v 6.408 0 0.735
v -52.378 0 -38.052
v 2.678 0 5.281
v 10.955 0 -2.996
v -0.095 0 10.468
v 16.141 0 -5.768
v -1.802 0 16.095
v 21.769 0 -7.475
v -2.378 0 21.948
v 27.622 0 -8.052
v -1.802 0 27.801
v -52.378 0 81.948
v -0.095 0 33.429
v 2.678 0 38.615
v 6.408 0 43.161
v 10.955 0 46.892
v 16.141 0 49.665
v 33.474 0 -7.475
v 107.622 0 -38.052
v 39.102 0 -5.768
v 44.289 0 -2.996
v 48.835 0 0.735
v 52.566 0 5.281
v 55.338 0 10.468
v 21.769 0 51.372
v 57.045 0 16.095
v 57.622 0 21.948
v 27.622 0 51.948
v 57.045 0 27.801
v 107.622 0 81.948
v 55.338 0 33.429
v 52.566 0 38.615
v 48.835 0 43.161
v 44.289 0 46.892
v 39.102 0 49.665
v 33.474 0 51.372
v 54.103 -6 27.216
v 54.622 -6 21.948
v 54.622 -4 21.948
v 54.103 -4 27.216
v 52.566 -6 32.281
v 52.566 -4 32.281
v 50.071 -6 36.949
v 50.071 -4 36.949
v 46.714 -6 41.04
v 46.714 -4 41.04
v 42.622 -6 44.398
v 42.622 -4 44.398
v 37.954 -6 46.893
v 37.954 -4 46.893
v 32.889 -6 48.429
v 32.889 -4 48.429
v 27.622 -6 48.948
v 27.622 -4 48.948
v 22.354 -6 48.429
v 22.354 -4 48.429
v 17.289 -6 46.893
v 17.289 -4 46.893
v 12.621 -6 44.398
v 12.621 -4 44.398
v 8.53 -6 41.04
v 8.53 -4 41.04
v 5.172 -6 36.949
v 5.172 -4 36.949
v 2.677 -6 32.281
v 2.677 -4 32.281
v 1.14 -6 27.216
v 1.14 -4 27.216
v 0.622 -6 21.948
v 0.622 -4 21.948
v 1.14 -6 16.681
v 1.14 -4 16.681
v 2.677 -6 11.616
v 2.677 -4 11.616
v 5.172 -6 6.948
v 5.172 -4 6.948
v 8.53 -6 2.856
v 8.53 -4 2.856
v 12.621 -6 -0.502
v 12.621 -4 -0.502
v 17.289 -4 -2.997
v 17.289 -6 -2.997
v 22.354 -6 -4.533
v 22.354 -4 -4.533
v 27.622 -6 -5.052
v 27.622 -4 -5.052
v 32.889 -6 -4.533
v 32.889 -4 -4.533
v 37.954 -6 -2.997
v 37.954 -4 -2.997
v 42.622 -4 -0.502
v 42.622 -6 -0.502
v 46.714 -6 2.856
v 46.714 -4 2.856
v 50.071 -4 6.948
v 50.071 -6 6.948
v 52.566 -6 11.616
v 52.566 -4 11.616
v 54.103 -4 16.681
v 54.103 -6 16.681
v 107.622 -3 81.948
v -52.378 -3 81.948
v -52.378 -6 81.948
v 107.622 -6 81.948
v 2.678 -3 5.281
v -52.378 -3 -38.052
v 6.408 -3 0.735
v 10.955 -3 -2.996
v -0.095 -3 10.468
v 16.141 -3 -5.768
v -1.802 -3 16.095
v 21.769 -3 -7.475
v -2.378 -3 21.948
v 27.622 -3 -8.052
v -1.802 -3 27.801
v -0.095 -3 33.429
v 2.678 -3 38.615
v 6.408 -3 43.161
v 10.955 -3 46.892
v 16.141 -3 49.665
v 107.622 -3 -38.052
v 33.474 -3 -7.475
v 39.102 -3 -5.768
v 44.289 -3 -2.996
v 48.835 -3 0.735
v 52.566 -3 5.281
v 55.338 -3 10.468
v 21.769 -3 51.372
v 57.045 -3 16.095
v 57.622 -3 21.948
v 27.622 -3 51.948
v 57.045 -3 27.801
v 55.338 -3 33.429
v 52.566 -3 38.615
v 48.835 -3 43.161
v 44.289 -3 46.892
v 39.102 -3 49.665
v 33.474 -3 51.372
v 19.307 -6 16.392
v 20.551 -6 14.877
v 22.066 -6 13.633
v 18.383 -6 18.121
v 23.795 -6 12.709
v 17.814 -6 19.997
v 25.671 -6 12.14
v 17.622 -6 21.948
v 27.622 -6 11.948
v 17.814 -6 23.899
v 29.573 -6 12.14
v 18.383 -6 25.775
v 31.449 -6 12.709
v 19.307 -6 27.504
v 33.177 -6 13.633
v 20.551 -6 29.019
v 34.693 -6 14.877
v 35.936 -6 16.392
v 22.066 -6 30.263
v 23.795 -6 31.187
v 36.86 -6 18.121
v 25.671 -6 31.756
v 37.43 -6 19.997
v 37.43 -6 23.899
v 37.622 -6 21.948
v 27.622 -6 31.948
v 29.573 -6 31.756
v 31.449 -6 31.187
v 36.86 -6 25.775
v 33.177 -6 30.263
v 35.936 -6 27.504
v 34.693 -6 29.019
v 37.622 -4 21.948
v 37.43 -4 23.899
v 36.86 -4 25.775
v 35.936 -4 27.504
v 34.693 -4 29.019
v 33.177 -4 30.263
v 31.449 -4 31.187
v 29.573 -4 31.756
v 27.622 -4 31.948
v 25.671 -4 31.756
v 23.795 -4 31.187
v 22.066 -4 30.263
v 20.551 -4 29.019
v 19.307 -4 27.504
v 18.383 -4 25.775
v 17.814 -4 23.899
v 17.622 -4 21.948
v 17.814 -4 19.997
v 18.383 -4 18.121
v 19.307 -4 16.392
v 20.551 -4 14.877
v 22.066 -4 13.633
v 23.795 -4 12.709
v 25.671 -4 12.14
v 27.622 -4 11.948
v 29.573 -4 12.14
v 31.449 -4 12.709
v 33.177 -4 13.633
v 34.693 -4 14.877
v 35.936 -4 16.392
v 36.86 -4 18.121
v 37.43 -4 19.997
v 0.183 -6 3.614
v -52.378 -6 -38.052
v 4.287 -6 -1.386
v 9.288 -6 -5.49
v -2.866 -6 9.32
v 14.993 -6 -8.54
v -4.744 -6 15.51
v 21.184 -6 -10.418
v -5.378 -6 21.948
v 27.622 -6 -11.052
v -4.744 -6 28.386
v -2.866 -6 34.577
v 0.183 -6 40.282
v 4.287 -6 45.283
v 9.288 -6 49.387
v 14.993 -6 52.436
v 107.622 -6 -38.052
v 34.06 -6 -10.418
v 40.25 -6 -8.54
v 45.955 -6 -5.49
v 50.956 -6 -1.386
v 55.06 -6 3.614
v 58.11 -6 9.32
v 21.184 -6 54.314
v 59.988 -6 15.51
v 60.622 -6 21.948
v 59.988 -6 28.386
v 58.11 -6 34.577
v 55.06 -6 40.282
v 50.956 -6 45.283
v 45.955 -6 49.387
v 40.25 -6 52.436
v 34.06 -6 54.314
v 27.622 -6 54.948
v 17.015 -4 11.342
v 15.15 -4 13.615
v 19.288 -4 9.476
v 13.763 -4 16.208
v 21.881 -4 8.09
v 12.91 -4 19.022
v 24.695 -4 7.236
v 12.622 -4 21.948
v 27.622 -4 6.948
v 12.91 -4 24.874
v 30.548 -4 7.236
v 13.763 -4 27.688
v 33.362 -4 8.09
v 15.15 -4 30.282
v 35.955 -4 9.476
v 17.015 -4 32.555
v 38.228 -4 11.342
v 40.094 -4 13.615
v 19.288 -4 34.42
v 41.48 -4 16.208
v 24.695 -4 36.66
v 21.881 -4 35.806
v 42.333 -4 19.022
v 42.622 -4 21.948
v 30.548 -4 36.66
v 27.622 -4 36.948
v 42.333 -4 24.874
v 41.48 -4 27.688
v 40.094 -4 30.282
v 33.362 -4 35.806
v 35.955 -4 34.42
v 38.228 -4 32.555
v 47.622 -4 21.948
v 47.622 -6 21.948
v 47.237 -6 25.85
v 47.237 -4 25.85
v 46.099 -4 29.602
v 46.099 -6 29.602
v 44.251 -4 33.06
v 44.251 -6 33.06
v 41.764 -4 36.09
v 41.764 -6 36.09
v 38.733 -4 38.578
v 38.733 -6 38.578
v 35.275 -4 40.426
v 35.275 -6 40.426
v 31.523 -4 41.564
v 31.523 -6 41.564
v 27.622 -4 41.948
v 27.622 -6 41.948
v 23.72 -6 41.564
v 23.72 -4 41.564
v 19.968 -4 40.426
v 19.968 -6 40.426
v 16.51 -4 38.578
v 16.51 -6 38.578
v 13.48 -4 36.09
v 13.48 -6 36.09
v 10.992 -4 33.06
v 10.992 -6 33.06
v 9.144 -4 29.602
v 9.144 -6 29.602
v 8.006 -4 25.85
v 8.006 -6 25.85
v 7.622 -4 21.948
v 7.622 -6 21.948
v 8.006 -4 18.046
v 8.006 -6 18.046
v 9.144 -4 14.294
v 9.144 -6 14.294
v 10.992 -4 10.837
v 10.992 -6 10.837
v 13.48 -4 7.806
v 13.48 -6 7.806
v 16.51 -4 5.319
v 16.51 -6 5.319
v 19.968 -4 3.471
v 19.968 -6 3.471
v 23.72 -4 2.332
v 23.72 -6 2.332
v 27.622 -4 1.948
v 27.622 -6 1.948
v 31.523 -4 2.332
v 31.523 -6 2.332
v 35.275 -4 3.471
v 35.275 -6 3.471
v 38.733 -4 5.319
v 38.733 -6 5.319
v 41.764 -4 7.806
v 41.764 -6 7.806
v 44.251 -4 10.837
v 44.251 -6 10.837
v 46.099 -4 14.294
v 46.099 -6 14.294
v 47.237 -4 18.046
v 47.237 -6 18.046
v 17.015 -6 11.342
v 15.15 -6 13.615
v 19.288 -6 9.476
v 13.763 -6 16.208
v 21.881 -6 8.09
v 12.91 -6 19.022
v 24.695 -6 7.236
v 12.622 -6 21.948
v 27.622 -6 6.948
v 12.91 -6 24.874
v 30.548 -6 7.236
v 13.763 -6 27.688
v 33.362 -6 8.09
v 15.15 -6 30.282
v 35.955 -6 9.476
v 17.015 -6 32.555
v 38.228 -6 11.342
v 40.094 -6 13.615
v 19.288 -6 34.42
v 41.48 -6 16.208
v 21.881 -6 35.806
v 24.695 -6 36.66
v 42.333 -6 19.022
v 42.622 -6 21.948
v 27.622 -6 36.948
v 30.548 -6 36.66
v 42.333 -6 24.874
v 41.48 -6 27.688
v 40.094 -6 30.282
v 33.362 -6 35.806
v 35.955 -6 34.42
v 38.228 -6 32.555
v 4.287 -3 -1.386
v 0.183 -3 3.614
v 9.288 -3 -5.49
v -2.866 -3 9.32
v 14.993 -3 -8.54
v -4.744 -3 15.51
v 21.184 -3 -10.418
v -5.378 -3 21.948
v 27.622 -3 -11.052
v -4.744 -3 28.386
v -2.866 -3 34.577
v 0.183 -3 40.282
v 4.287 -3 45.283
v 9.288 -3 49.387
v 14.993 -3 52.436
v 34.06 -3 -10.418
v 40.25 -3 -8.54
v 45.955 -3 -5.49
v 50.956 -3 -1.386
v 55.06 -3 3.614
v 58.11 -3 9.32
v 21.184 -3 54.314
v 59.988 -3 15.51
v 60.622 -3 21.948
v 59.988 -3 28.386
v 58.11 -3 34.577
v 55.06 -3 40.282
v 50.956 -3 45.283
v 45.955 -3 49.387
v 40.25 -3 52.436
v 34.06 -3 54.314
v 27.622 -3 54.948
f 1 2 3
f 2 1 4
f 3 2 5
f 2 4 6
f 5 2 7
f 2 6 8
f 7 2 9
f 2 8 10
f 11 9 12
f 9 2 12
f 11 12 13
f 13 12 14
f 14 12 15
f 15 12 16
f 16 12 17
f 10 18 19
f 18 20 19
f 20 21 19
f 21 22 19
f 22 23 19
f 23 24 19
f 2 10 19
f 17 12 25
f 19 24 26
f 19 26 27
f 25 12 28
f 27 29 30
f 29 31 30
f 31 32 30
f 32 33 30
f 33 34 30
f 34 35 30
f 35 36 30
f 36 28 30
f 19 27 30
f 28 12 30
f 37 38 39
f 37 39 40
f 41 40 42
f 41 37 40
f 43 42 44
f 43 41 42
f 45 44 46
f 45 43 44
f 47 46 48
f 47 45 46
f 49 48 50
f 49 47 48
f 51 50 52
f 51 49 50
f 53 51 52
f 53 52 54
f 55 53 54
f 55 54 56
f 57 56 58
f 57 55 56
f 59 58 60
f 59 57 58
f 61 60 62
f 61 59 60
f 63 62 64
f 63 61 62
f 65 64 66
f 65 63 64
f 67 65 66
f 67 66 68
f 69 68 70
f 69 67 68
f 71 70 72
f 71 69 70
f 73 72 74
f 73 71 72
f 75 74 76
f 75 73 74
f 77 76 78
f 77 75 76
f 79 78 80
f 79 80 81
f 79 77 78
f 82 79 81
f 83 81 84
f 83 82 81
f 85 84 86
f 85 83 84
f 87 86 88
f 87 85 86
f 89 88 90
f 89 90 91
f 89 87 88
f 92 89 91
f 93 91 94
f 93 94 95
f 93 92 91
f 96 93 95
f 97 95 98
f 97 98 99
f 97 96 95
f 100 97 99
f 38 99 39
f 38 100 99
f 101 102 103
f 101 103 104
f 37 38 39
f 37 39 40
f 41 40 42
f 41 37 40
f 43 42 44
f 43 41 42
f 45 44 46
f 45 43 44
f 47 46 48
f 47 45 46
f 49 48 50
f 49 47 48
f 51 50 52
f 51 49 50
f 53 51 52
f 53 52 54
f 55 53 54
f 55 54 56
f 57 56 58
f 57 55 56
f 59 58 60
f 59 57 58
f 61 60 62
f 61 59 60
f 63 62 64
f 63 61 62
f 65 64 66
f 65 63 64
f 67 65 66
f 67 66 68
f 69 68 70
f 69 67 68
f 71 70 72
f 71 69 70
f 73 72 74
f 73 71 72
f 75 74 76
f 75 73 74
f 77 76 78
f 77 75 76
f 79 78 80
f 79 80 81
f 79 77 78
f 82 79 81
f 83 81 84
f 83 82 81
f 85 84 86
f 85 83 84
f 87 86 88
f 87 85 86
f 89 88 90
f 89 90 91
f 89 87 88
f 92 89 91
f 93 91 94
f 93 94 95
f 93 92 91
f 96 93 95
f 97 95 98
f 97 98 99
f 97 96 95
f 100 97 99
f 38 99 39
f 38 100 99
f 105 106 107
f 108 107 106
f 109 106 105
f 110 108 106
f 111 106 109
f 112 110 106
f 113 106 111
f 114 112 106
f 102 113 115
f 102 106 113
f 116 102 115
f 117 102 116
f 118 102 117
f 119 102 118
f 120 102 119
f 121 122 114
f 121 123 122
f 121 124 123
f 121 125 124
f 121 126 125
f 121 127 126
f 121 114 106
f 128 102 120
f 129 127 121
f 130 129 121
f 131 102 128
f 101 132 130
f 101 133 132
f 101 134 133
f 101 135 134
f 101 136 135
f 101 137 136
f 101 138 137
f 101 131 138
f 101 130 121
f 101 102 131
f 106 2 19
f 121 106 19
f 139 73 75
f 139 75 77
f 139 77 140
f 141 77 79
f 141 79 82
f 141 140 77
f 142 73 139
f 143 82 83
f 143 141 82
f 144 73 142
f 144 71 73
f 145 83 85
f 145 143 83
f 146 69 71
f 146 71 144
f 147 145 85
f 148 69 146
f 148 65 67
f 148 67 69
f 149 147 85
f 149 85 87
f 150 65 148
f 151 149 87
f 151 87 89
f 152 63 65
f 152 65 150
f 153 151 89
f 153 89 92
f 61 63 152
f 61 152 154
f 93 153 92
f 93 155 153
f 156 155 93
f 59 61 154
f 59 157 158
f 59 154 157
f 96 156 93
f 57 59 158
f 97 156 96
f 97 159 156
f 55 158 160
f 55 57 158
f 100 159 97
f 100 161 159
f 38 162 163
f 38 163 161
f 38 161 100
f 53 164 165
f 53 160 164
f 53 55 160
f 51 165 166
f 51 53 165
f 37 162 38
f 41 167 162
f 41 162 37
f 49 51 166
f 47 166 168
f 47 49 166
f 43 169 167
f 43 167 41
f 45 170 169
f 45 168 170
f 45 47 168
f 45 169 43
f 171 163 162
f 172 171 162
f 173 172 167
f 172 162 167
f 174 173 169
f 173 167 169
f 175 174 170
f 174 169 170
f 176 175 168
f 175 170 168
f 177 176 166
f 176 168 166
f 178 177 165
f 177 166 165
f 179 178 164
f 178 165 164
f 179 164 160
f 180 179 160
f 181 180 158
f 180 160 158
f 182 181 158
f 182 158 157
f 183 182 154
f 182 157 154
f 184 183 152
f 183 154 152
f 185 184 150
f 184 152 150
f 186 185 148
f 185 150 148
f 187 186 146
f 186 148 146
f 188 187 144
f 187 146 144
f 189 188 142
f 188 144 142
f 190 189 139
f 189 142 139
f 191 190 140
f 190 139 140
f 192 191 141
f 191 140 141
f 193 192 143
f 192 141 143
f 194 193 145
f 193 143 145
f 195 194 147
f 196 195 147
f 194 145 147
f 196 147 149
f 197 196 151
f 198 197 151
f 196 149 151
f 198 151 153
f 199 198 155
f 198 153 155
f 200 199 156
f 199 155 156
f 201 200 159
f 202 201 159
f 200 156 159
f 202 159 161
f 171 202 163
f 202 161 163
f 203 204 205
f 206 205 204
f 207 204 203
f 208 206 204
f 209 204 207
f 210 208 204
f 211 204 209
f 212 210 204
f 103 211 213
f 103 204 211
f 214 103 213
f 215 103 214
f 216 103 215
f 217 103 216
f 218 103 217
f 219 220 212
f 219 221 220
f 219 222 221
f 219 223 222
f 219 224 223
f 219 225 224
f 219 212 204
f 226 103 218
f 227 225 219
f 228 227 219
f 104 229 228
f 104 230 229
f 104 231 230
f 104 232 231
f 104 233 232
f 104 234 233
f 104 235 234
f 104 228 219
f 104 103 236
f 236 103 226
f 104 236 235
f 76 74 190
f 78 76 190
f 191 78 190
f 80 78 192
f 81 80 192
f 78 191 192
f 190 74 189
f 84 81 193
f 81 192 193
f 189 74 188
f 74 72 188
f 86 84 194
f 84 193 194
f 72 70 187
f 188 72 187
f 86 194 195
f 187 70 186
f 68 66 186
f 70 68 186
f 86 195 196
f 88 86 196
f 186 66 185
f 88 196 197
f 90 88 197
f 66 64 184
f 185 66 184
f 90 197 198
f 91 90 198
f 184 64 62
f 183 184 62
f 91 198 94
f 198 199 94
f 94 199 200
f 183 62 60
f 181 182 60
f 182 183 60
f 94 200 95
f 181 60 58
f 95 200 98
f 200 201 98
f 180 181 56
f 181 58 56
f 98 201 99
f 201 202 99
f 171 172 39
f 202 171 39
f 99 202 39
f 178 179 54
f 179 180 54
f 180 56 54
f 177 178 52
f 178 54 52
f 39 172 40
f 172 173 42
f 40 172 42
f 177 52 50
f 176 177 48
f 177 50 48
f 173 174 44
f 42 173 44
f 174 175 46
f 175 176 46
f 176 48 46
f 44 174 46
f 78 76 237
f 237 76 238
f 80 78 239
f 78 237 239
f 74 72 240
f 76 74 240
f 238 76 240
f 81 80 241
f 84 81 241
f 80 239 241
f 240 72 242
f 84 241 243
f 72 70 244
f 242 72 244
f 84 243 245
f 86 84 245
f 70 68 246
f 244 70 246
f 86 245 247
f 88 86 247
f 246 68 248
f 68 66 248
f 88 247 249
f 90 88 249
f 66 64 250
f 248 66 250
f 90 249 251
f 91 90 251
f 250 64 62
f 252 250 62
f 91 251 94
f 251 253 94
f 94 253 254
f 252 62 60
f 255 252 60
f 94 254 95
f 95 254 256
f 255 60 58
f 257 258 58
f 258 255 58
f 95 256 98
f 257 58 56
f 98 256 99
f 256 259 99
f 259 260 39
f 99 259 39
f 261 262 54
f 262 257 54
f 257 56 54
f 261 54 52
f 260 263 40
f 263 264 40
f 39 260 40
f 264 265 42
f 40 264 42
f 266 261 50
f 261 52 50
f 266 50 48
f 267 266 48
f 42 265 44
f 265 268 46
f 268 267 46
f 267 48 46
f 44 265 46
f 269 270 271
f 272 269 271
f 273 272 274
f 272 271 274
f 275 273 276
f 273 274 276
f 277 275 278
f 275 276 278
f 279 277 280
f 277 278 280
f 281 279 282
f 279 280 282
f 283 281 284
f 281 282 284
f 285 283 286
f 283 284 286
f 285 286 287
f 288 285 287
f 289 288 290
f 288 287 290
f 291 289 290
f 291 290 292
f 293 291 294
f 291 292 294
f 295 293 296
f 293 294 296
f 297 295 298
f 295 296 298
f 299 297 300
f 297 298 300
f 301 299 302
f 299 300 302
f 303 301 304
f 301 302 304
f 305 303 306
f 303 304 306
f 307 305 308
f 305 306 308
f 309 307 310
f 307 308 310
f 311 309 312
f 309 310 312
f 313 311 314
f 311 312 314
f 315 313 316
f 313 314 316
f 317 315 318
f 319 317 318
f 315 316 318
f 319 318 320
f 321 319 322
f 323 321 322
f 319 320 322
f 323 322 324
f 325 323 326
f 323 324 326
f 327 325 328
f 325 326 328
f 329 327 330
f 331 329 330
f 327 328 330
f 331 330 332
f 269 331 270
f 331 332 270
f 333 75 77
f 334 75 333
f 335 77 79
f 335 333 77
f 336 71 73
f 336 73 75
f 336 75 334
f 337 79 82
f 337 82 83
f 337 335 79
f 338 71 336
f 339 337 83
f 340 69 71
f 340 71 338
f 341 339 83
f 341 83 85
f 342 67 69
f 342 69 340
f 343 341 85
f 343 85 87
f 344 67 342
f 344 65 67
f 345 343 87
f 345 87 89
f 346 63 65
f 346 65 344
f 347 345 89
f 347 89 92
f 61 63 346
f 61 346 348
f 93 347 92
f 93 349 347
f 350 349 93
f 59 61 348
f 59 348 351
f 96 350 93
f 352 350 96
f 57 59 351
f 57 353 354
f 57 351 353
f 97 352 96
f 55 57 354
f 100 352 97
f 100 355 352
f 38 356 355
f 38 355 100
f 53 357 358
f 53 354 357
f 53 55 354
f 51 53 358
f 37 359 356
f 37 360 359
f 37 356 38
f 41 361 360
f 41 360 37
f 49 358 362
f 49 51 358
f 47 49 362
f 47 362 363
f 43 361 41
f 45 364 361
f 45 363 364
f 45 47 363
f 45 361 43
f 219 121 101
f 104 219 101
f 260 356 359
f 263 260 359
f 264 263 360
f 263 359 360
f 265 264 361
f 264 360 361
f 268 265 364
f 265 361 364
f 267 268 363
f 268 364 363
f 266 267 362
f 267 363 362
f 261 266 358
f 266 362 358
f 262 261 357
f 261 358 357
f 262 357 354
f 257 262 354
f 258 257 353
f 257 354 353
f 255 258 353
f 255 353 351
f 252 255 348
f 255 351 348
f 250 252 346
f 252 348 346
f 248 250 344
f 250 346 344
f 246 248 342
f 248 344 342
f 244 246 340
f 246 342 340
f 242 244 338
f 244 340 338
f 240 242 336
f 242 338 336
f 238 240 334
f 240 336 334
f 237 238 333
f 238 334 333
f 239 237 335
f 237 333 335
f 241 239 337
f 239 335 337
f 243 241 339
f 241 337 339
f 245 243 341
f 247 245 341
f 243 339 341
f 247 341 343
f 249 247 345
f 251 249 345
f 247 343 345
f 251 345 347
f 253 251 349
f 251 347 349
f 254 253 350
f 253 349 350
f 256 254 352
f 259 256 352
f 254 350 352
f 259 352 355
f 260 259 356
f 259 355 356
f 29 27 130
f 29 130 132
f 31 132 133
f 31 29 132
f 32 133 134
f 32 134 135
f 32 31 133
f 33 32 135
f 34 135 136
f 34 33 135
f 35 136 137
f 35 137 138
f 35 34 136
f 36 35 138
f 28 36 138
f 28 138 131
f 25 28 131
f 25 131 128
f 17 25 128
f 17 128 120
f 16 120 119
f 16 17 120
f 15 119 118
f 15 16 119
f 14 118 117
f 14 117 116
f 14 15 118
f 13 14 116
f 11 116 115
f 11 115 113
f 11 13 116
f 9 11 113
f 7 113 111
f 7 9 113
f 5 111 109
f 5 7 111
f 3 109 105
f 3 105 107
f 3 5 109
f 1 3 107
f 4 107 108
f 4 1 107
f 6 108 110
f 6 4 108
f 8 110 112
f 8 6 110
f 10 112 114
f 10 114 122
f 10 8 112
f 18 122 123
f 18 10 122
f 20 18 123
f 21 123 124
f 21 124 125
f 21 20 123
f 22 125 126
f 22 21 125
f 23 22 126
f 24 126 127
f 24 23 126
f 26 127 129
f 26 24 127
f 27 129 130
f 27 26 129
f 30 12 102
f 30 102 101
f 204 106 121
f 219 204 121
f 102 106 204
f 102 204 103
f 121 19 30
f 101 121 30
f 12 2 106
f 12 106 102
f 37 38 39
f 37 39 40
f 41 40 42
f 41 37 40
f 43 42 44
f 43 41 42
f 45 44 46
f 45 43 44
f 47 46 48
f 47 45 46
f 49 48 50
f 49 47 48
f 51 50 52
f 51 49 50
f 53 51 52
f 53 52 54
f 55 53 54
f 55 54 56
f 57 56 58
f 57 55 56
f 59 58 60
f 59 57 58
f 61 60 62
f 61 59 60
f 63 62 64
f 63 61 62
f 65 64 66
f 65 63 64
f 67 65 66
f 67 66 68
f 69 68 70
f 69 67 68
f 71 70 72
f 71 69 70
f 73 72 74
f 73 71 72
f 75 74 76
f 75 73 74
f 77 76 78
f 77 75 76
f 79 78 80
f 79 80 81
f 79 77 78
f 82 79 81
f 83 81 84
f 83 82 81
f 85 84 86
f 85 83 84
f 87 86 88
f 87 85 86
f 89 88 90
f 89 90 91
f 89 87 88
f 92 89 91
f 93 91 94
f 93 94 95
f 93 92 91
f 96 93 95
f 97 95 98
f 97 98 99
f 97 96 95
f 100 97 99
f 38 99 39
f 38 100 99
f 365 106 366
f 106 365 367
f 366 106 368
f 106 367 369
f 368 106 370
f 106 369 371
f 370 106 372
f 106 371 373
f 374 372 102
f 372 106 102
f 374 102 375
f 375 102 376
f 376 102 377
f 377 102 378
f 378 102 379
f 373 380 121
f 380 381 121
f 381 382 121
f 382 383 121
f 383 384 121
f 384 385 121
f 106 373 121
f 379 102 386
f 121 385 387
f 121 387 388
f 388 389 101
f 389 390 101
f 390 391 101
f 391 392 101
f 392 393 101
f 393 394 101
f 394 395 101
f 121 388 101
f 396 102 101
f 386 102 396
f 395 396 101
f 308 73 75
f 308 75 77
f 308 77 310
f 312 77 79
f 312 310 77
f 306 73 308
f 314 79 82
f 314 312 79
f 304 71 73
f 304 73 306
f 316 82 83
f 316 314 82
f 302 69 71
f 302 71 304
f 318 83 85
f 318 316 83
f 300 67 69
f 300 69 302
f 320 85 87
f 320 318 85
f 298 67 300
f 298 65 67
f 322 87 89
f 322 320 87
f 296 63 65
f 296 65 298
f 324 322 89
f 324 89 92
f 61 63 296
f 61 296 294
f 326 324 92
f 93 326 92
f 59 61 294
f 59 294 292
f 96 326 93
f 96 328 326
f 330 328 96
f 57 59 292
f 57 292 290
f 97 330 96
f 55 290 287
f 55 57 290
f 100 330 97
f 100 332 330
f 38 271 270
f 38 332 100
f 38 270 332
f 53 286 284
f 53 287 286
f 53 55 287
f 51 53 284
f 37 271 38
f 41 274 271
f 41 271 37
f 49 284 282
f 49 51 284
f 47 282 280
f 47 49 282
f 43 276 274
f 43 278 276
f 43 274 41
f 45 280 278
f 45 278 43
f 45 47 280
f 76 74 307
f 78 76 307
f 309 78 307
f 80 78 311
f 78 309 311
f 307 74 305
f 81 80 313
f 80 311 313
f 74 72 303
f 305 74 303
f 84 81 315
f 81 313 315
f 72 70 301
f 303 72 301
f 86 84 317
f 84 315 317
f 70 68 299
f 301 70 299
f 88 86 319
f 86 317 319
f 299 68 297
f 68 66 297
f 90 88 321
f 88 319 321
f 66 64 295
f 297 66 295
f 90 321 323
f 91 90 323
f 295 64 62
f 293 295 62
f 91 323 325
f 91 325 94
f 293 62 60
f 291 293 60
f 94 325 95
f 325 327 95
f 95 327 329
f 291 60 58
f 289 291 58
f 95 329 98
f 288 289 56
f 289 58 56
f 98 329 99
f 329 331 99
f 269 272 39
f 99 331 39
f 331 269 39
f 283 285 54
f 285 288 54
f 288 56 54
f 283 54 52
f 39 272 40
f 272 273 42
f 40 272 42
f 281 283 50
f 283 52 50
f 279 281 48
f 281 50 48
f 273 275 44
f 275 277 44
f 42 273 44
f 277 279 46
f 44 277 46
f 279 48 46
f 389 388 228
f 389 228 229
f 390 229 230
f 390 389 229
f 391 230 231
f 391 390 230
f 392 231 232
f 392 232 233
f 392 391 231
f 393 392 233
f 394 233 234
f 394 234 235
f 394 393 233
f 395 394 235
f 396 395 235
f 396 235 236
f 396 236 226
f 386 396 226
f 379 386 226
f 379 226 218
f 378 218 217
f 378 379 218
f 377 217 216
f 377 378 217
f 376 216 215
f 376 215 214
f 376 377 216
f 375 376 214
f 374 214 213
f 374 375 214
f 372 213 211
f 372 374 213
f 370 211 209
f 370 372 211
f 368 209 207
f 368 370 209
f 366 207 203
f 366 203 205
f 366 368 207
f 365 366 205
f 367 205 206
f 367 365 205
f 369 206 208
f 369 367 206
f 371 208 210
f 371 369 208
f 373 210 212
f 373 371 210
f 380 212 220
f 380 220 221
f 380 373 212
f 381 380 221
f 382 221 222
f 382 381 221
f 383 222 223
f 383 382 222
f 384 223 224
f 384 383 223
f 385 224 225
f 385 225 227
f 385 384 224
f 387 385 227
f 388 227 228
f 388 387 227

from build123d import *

# Parameters (mm, degrees)
F0_W     = 160
F0_H     = 120
F0_R     = 30
F1_DEPTH = 3
F2_W     = 160
F2_H     = 120
F2_R     = 33
F3_DEPTH = 3
F4_R     = 27
F4_R_2   = 20
F5_DEPTH = 2
F6_R     = 27
F6_R_2   = 15
F7_DEPTH = 2
F8_R     = 27
F8_R_2   = 10
F9_DEPTH = 2


with BuildPart() as f1:
    # F0 (on Front) → F1 (new body)
    with BuildSketch(Plane.XZ):
        with Locations((27.621666, 21.948145)):
            Rectangle(F0_W, F0_H)
        with Locations((27.621666, 21.948145)):
            Circle(F0_R, mode=Mode.SUBTRACT)
    extrude(amount=F1_DEPTH)


with BuildPart() as f3:
    # F2 (on face) → F3 (new body)
    with BuildSketch(Plane.XZ.offset(3)):
        with Locations((27.621666, 21.948145)):
            Rectangle(F2_W, F2_H)
        with Locations((27.621666, 21.948145)):
            Circle(F2_R, mode=Mode.SUBTRACT)
    extrude(amount=F3_DEPTH)


with BuildPart() as f5:
    # F4 (on face) → F5 (new body)
    with BuildSketch(Plane.XZ.offset(6)):
        with Locations((27.621666, 21.948145)):
            Circle(F4_R)
        with Locations((27.621666, 21.948145)):
            Circle(F4_R_2, mode=Mode.SUBTRACT)
    extrude(amount=-F5_DEPTH)


with BuildPart() as f7:
    # F6 (on face) → F7 (new body)
    with BuildSketch(Plane.XZ.offset(6)):
        with Locations((27.621666, 21.948145)):
            Circle(F6_R)
        with Locations((27.621666, 21.948145)):
            Circle(F6_R_2, mode=Mode.SUBTRACT)
    extrude(amount=-F7_DEPTH)


with BuildPart() as f9:
    # F8 (on face) → F9 (new body)
    with BuildSketch(Plane.XZ.offset(6)):
        with Locations((27.621666, 21.948145)):
            Circle(F8_R)
        with Locations((27.621666, 21.948145)):
            Circle(F8_R_2, mode=Mode.SUBTRACT)
    extrude(amount=-F9_DEPTH)


solid = Compound([f1.part, f3.part, f5.part, f7.part, f9.part])
